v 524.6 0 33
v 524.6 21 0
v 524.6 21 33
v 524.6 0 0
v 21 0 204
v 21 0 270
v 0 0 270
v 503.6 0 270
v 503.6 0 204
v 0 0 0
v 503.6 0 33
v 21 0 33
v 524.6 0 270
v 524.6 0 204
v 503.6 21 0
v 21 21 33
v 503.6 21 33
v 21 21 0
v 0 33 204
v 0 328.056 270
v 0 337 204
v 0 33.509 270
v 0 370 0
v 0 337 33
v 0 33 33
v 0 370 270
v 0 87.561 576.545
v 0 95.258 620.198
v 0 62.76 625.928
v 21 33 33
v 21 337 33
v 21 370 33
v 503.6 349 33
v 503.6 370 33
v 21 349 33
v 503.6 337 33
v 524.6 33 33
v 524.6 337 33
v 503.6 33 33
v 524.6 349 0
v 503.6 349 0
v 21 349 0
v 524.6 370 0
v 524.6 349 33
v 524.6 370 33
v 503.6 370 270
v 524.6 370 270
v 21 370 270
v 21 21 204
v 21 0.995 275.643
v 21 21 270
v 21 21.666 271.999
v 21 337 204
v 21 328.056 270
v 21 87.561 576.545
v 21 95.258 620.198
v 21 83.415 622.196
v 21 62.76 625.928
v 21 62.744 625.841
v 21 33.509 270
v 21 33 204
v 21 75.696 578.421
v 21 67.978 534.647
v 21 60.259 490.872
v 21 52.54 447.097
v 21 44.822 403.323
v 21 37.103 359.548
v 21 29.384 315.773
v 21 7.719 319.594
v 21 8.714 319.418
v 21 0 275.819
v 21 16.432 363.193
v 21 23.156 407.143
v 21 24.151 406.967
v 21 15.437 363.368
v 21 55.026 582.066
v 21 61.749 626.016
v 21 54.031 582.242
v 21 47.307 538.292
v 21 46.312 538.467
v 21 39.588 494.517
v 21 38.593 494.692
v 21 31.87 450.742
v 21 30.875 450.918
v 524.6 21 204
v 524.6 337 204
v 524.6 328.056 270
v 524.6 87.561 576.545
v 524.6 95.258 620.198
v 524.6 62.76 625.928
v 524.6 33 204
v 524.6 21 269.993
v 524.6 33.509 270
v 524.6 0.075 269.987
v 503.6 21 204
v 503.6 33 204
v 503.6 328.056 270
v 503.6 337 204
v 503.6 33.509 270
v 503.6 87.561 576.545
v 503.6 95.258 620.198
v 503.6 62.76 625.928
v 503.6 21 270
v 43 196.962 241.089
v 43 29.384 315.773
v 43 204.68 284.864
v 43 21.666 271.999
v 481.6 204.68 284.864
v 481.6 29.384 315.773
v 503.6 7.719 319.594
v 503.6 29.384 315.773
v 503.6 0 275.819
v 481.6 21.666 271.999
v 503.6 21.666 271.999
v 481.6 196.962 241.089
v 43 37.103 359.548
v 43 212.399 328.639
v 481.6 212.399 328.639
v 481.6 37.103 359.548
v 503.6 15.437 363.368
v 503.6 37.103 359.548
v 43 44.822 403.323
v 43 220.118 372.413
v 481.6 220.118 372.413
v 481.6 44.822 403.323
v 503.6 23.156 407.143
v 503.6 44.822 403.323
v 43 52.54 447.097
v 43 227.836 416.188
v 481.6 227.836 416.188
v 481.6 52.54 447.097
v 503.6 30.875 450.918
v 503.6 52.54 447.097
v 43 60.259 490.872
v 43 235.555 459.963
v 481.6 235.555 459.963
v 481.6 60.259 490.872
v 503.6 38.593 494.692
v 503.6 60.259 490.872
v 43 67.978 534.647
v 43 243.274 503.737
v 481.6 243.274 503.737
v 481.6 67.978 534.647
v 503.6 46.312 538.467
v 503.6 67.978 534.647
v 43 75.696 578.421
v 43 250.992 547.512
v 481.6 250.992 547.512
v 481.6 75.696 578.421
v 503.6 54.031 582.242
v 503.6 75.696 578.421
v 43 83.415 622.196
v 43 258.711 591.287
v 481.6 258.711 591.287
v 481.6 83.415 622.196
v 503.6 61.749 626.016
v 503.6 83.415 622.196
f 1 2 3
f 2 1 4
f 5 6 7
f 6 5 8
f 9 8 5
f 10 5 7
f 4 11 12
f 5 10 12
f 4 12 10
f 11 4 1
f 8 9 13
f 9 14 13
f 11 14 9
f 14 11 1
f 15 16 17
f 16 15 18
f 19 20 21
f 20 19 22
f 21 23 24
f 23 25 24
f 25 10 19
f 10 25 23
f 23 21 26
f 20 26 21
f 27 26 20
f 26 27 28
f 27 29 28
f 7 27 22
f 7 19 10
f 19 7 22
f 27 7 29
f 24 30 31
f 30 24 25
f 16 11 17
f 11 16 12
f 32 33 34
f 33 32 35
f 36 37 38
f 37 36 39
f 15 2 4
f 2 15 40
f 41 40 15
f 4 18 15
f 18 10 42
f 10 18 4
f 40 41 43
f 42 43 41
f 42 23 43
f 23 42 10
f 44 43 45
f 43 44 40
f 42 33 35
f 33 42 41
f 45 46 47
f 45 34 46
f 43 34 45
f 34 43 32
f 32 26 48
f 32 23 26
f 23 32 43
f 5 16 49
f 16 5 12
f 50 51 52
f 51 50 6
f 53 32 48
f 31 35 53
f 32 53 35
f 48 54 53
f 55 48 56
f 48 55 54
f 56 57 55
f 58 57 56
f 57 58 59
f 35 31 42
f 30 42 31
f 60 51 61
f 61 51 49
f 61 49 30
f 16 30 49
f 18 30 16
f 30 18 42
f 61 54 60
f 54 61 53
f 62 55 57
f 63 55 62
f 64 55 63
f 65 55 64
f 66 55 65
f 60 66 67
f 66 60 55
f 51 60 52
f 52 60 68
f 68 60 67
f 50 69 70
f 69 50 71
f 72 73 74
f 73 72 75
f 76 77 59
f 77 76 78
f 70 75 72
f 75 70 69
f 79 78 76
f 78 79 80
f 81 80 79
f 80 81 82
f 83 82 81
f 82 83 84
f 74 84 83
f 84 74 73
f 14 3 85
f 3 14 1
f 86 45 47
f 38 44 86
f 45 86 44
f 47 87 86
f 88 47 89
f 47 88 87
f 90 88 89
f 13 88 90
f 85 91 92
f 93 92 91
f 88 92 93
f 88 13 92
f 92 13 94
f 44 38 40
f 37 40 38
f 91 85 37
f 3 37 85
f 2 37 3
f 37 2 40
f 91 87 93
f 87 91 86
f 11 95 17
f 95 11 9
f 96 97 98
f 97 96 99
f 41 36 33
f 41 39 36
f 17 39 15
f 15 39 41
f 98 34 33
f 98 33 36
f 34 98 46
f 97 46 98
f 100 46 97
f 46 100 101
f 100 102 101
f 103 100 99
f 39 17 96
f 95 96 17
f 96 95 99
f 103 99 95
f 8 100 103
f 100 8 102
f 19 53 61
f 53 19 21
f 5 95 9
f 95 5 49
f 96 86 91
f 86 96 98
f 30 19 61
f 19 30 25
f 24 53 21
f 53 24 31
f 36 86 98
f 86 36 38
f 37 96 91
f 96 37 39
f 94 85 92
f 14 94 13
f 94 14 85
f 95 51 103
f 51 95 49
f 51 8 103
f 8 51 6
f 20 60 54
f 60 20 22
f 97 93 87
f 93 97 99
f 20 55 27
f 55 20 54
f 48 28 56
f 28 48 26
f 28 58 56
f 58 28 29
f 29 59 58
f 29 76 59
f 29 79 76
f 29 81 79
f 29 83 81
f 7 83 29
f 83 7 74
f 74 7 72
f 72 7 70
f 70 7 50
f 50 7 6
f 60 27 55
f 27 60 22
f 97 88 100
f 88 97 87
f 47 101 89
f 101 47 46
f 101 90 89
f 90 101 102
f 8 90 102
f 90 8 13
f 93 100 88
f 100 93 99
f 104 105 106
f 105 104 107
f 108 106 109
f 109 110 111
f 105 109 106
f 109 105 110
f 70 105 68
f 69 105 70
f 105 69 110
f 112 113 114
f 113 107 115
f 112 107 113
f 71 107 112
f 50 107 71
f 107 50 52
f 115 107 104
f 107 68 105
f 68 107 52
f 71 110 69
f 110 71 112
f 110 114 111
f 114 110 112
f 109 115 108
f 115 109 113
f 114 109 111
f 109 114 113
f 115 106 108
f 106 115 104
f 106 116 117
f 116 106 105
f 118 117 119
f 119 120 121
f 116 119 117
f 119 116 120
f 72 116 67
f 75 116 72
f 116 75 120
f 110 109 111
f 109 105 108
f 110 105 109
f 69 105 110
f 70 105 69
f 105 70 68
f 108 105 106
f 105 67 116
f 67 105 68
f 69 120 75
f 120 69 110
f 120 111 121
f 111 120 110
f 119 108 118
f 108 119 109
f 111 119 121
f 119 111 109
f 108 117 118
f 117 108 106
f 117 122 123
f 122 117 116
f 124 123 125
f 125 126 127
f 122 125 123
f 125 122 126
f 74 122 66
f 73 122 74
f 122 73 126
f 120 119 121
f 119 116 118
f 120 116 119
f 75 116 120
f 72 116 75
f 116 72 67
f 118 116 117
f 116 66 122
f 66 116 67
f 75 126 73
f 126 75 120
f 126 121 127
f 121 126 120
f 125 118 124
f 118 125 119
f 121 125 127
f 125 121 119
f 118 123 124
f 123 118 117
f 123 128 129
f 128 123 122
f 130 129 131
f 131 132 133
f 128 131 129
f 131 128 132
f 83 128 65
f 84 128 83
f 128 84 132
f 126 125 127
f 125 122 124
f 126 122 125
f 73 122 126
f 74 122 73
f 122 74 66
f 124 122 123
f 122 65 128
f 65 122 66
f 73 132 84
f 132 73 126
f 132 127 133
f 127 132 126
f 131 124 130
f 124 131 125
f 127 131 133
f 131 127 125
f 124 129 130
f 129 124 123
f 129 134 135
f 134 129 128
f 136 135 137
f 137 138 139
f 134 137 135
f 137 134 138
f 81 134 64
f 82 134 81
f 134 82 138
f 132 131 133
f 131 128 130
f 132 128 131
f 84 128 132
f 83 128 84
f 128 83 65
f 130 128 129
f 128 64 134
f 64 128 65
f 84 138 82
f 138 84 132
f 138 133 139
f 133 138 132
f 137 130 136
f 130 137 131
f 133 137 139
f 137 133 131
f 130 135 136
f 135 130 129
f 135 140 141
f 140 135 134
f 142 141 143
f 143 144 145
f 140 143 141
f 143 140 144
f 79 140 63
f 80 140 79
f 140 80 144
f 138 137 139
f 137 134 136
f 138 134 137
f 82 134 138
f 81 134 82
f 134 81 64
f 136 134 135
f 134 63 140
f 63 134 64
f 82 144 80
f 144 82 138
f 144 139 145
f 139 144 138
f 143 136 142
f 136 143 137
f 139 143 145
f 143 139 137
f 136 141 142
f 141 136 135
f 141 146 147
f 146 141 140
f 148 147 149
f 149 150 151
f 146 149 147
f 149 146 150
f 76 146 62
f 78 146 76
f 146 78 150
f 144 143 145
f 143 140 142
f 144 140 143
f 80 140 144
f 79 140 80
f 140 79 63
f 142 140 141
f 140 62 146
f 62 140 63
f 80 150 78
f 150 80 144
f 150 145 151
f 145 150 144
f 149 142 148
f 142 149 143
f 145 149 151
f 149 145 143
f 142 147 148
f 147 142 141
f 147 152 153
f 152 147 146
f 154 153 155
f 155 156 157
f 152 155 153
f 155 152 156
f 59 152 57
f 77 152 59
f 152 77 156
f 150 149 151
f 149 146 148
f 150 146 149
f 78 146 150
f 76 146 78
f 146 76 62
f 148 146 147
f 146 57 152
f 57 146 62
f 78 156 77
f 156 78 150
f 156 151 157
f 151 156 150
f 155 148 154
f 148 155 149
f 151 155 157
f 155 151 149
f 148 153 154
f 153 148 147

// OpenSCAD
// file: rotate.scad
module rotate_about(a, pv) {
  translate(v = pv) rotate(a = a) translate(v = -pv) children();
}
// file: math.scad
function triangle_side_two_sides_angle(l1, l2, angle) =
    sqrt(pow(l1, 2) + pow(l2, 2) - 2 * l1 * l2 * cos(angle));

function triangle_A_from_all_sides(a, b, c) =
    acos((pow(b, 2) + pow(c, 2) - pow(a, 2)) / (2 * b * c));
// file: beam.scad
nothing = 0.01;

module beam(length, long_side, short_side, a_start_short,
            a_start_long, a_stop_short, a_stop_long) {
  difference() {
    cube([ length, long_side, short_side ]);

    /*
      make the ends angled by subtracting a triangle from them

         a        b        c
      ------ = ------ = ------
      sin(A)   sin(B)   sin(C)
              B
             /\
          c /  \ a
           /    \
        A /______\ C
              b

      two angles and a side is always known
      - the corner angle which is always 90
      - the angle parameter
      - the length of the side which is going to be angled
    */

    if (!is_undef(a_start_short)) {
      /*
        A angle is 90
        B angle is 90 - a_start_short
        C angle is a_start_short
        c side is short_side
        b side length is missing

        b = c * sin(C) / sin(B)
      */

      b_length =
          short_side * sin(a_start_short) / sin(90 - a_start_short);

      if (a_start_short > 0) {
        translate([ -nothing, long_side + nothing, -nothing ])
            rotate([ 90, 0, 0 ])
                linear_extrude(long_side + 2 * nothing)
                    polygon(points = [
                      [ -nothing, 0 ], [ 0, short_side - nothing ],
                      [ b_length + nothing, -nothing ]
                    ]);
      } else {
        translate([ -nothing, -nothing, short_side + nothing ])
            rotate([ -90, 0, 0 ])
                linear_extrude(long_side + 2 * nothing)
                    polygon(points = [
                      [ -nothing, short_side ],
                      [ -b_length, -nothing ], [ 0, -nothing ]
                    ]);
      }
    } else if (!is_undef(a_start_long)) {
      /*
        A angle is 90
        B angle is 90 - a_start_long
        C angle is a_start_long
        c side is long_side
        b side length is missing

        b = c * sin(C) / sin(B)
      */

      b_length =
          long_side * sin(a_start_long) / sin(90 - a_start_long);

      if (a_start_long > 0) {
        translate([ -nothing, -nothing, -nothing ])
            linear_extrude(short_side + 2 * nothing)
                polygon(points = [
                  [ -nothing, 0 ], [ 0, long_side - nothing ],
                  [ b_length + nothing, -nothing ]
                ]);
      } else {
        translate([ -nothing, 0, -nothing ])
            linear_extrude(short_side + 2 * nothing)
                polygon(points = [
                  [ -b_length, long_side + nothing ], [ 0, 0 ],
                  [ 0, long_side + nothing ]
                ]);
      }
    }

    if (!is_undef(a_stop_short)) {
      /*
        A angle is 90
        B angle is 90 - a_stop_short
        C angle is a_stop_short
        c side is short_side
        b side length is missing

        b = c * sin(C) / sin(B)
      */

      b_length =
          short_side * sin(a_stop_short) / sin(90 - a_stop_short);

      if (a_stop_short > 0) {
        translate([ 0, long_side + nothing, 0 ]) rotate([ 90, 0, 0 ])
            linear_extrude(long_side + 2 * nothing) polygon(
                points = [[length + nothing, 0],
                          [length + nothing, short_side + nothing],
                          [length - b_length + nothing,
                           short_side + nothing]]);
      } else {
        translate([ 0, long_side + nothing, -nothing ]) rotate(
            [ 90, 0, 0 ]) linear_extrude(long_side + 2 * nothing)
            polygon(points =
                        [[length + b_length, 0],
                         [length + nothing, 0],
                         [length + nothing, short_side + nothing]]);
      }
    } else if (!is_undef(a_stop_long)) {
      /*
        A angle is 90
        B angle is 90 - a_stop_long
        C angle is a_stop_long
        c side is long_side
        b side length is missing

        b = c * sin(C) / sin(B)
      */

      b_length = long_side * sin(a_stop_long) / sin(90 - a_stop_long);

      if (a_stop_long > 0) {
        translate([ 0, 0, -nothing ])
            linear_extrude(short_side + 2 * nothing) polygon(
                points = [[length - b_length, long_side + nothing],
                          [length + nothing, -nothing],
                          [length + nothing, long_side + nothing]]);
      } else {
        translate([ 0, 0, -nothing ])
            linear_extrude(short_side + 2 * nothing) polygon(
                points = [[length + b_length, -nothing],
                          [length + nothing, -nothing],
                          [length + nothing, long_side + nothing]]);
      }
    }
  }
}

beam(length = 100, long_side = 33, short_side = 22,
     a_start_short = 30, a_stop_short = 30);
// main file
use <beam.scad>
use <math.scad>
use <rotate.scad>

function rack_unit_width() = 482.6;
function rack_unit_height() = 44.45;

function unit_to_length(units) = units * rack_unit_height();
function start_at_unit(unit) = unit * rack_unit_height();

module rack_enclosure(units = 0, depth, tilt_angle,
                      override_tilt_offset, beam_long_side,
                      beam_short_side, spacing_from_surface,
                      frame_color) {
  outer_width = rack_unit_width() + 2 * beam_short_side;
  // when the tilting angle is greater than zero, additional space is
  // needed so that the rack ears can fit
  offset_due_tilt =
      is_undef(override_tilt_offset)
          ? beam_long_side * sin(tilt_angle) / sin(90 - tilt_angle)
          : override_tilt_offset;

  module rack_beam(length, rotation = [ 0, 0, 0 ], a_start_short,
                   a_start_long, a_stop_short, a_stop_long, ) {
    rotate(rotation) beam(
        length = length, short_side = beam_short_side,
        long_side = beam_long_side, a_start_short = a_start_short,
        a_start_long = a_start_long, a_stop_short = a_stop_short,
        a_stop_long = a_stop_long);
  }

  module frame(rear_beam = false) {
    module frame_beam(length) {
      translate(v = [ 0, beam_short_side, 0 ]) rotate([ 90, 0, 0 ])
          rack_beam(length = length);
    }

    // front
    frame_beam(outer_width);

    if (rear_beam) {
      // rear
      translate(v = [ 0, depth - beam_short_side, 0 ])
          frame_beam(outer_width);
    }

    // left
    translate(v = [ beam_short_side, beam_short_side, 0 ])
        rotate([ 0, 0, 90 ])
            frame_beam(depth - (rear_beam ? 2 : 1) * beam_short_side);
    // right
    translate(v = [ outer_width, beam_short_side, 0 ])
        rotate([ 0, 0, 90 ])
            frame_beam(depth - (rear_beam ? 2 : 1) * beam_short_side);
  }

  module riser() {
    module legs() {
      module leg() {
        translate(v = [ beam_short_side, 0, 0 ]) rotate([ 0, -90, 0 ])
            rack_beam(length =
                          spacing_from_surface - 3 * beam_long_side);
      }

      // front left
      leg();
      // rear left
      translate(v = [ 0, depth - beam_long_side, 0 ]) leg();
      // rear right
      translate(v = [
        outer_width - beam_short_side, depth - beam_long_side, 0
      ]) leg();
      // front right
      translate(v = [ outer_width - beam_short_side, 0, 0 ]) leg();
    }

    frame(rear_beam = true);
    translate(v = [ 0, 0, beam_long_side ]) legs();
    translate(v = [ 0, 0, spacing_from_surface - 2 * beam_long_side ])
        frame();
  }

  module enclosure(front_tilt_angle) {
    frontal_beam_length = unit_to_length(units) + offset_due_tilt;

    module vertical_enclosure_beam(length, start_angle, stop_angle) {
      translate([ 0, beam_long_side, 0 ]) rotate([ 90, -90, 90 ])
          rack_beam(length = length, a_start_long = start_angle,
                    a_stop_long = stop_angle);
    }

    module frontal_beam() {
      translate(v = [ 0, 0, beam_long_side ])
          rotate(a = [ -front_tilt_angle, 0, 0 ])
              vertical_enclosure_beam(length = frontal_beam_length,
                                      start_angle = front_tilt_angle);
    }

    module rear_beam() {
      frontal_beam_inner_offset =
          beam_long_side * sin(tilt_angle) / sin(90 - tilt_angle);
      frontal_beam_inner_length =
          frontal_beam_length - frontal_beam_inner_offset;

      frame_inner_offset = beam_long_side / sin(90 - tilt_angle);
      frame_inner_length = depth - frame_inner_offset;

      length = triangle_side_two_sides_angle(
          frame_inner_length, frontal_beam_inner_length,
          90 - front_tilt_angle);

      angle = 90 - triangle_A_from_all_sides(
                       a = frontal_beam_inner_length, b = length,
                       c = frame_inner_length);

      translate([ 0, depth - beam_long_side, beam_long_side ])
          rotate_about(a = [ angle, 0, 0 ],
                       pv = [ 0, beam_long_side, 0 ])
              vertical_enclosure_beam(
                  length = length, start_angle = -angle,
                  stop_angle = 90 - front_tilt_angle - angle);
    }

    rear_beam();
    frontal_beam();
    translate(v = [ outer_width - beam_short_side, 0, 0 ]) {
      rear_beam();
      frontal_beam();
    }

    frame();
  }

  color(frame_color) {
    riser();
    translate(v = [ 0, 0, spacing_from_surface - beam_long_side ])
        enclosure(front_tilt_angle = tilt_angle);
  }

  translate(v = [
    beam_short_side, 0, spacing_from_surface + offset_due_tilt
  ]) rotate(a = [ -tilt_angle, 0, 0 ]) children();
}

module rack_instrument(units, depth, c, label) {
  height = unit_to_length(units);
  module instrument() {
    color("black") cube([ 22, 22, height ]);

    translate([ rack_unit_width() - 22, 0, 0 ]) color("black")
        cube([ 22, 22, height ]);

    color(c) translate([ 22, 0, 0 ])
        cube([ rack_unit_width() - 44, depth, height ]);
  }

  union() {
    instrument();

    if (label) {
      translate([ rack_unit_width() / 2, 0, height / 2 ])
          rotate([ 90, 0, 0 ])
              text(label, halign = "center", valign = "center");
    }
  }
}

rack_enclosure(units = 8, tilt_angle = 10, depth = 370,
               spacing_from_surface = 270, beam_long_side = 33,
               beam_short_side = 21, frame_color = "#9c4000") {
  for (i = [0:1:7]) {
    translate([ 0, 0, start_at_unit(i) ])
        rack_instrument(units = 1, depth = 200);
  }
}
